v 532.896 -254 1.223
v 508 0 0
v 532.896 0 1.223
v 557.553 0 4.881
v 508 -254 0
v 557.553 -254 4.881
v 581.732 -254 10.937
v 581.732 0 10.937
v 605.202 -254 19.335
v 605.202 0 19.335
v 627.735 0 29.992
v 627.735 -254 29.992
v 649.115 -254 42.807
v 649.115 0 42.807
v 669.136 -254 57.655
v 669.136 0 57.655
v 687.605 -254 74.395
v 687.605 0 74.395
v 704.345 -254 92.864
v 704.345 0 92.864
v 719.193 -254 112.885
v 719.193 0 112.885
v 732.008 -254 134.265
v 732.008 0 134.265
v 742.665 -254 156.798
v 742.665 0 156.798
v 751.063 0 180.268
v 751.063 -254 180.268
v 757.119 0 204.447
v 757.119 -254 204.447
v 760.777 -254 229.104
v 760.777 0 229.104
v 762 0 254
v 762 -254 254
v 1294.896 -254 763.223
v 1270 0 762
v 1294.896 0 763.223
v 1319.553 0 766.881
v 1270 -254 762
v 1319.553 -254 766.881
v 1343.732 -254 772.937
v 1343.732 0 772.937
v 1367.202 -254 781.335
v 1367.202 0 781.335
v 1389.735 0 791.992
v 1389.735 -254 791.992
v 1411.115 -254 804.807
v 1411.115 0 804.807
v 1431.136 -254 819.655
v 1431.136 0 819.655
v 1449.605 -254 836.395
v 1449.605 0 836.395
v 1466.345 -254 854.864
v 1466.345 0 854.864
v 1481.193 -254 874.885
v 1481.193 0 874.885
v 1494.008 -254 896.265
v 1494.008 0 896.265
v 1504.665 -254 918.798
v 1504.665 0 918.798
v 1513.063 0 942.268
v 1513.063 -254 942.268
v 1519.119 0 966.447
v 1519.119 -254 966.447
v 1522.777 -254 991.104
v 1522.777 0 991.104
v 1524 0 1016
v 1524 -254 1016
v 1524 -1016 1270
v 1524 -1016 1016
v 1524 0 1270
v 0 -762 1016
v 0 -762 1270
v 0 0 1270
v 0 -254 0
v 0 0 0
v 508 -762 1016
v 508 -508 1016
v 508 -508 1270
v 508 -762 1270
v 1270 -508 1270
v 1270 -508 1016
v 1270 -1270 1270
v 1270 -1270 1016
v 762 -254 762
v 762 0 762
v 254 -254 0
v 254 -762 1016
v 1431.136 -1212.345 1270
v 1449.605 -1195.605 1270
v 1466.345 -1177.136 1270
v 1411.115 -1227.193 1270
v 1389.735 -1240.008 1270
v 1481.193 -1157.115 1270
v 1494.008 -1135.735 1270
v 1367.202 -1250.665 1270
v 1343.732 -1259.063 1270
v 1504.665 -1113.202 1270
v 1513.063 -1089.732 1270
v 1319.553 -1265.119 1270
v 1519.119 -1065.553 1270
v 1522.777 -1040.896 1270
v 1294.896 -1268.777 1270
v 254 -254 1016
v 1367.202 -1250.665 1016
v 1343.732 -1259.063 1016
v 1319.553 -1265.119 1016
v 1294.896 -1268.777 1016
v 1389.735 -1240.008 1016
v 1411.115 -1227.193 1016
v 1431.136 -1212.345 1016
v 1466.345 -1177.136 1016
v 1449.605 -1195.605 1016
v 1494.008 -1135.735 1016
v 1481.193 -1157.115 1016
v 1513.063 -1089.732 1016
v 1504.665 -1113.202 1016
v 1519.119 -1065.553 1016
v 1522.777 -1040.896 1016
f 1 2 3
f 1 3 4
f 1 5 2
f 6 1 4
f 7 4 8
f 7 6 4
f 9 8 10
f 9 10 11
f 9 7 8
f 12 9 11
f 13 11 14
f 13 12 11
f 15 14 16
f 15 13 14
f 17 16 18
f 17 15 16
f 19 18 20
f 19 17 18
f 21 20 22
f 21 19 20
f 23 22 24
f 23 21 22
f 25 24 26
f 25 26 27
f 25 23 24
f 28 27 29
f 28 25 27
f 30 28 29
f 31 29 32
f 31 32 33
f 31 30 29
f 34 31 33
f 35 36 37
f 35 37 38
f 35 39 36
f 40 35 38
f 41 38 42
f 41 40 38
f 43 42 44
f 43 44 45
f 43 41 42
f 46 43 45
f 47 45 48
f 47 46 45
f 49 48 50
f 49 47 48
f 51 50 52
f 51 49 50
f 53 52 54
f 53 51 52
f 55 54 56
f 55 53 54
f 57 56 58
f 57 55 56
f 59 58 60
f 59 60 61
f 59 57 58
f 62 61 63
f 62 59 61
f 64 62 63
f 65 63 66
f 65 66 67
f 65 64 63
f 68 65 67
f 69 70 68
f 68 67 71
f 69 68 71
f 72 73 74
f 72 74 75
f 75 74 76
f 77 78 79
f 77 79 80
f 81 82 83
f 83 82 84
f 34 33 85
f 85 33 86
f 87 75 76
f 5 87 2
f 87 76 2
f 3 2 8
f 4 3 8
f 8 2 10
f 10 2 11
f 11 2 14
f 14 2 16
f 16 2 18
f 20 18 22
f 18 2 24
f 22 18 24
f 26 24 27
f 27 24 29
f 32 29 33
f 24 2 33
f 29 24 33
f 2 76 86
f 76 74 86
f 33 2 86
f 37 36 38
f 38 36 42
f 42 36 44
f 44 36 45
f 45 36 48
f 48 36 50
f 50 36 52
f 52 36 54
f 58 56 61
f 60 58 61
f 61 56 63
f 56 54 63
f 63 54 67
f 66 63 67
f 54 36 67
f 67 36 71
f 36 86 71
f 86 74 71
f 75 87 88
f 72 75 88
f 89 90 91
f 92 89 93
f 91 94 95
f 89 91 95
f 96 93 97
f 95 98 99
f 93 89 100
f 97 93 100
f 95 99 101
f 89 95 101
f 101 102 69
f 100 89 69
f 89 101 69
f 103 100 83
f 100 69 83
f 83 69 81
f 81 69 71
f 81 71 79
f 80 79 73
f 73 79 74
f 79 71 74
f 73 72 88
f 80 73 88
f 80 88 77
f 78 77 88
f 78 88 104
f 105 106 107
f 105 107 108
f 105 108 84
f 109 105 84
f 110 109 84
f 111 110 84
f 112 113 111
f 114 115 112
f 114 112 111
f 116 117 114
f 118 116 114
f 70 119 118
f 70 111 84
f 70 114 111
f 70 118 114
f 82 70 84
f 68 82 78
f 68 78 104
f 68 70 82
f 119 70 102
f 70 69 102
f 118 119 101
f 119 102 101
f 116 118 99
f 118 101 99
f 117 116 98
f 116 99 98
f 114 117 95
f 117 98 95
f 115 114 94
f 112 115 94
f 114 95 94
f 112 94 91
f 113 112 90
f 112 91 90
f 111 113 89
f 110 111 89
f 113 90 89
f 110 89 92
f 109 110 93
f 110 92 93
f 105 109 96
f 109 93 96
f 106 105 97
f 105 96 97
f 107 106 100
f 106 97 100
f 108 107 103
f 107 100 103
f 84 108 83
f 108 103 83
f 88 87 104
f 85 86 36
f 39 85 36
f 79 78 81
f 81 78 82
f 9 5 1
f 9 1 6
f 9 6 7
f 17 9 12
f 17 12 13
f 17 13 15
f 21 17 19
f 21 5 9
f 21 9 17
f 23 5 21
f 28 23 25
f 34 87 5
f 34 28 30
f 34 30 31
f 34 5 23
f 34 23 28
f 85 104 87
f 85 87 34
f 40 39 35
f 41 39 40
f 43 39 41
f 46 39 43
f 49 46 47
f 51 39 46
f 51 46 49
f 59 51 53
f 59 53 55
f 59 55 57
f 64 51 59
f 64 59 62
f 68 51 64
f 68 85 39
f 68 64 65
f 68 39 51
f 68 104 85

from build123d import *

# Parameters (mm, degrees)
F1_DEPTH  = 1270
F2_W      = 508
F2_H      = 762
F3_DEPTH  = 1016
F4_W      = 1270
F4_H      = 254
F5_DEPTH  = 1016
F6_W      = 762
F6_H      = 762
F7_DEPTH  = 254.001
F8_W      = 508
F8_H      = 1016
F9_DEPTH  = 254.001
F11_DEPTH = 254.001
F12_W     = 508
F12_H     = 508
F13_DEPTH = 254.001
F14_R     = 254
F15_R     = 253.99999


# Not quite as in the source:
# - a fillet or chamfer is up to 0.001 mm smaller than in the source, because OpenCascade refuses the exact size


with BuildPart() as f1:
    # F0 (on Front) → F1 (new body)
    with BuildSketch(Plane.XZ):
        Polygon((0, 1270), (0, 0), (762, 0), (762, 762), (1524, 762), (1524, 1270), align=None)
    extrude(amount=F1_DEPTH)

    # F2 (on face) → F3 (cut)
    with BuildSketch(Plane.XZ.offset(1270)):
        with Locations((508, 381)):
            Rectangle(F2_W, F2_H)
    extrude(amount=-F3_DEPTH, mode=Mode.SUBTRACT)

    # F4 (on face) → F5 (cut)
    with BuildSketch(Plane.XZ.offset(1270)):
        with Locations((889, 889)):
            Rectangle(F4_W, F4_H)
    extrude(amount=-F5_DEPTH, mode=Mode.SUBTRACT)

    # F6 (on face) → F7 (cut, through all)
    with BuildSketch(Plane(origin=(0, 0, 1016), x_dir=(1, 0, 0), z_dir=(0, 0, -1))):
        with Locations((889, 889)):
            Rectangle(F6_W, F6_H)
    extrude(amount=-F7_DEPTH, mode=Mode.SUBTRACT)

    # F8 (on face) → F9 (cut, through all)
    with BuildSketch(Plane.YZ.offset(254)):
        with Locations((-1016, 508)):
            Rectangle(F8_W, F8_H)
    extrude(amount=-F9_DEPTH, mode=Mode.SUBTRACT)

    # F10 (on face) → F11 (cut, through all)
    with BuildSketch(Plane.YZ.offset(254)):
        Polygon((-254, 0), (-762, 1016), (-762, 0), align=None)
    extrude(amount=-F11_DEPTH, mode=Mode.SUBTRACT)

    # F12 (on face) → F13 (cut, through all)
    with BuildSketch(Plane(origin=(0, 0, 1016), x_dir=(1, 0, 0), z_dir=(0, 0, -1))):
        with Locations((254, 1016)):
            Rectangle(F12_W, F12_H)
    extrude(amount=-F13_DEPTH, mode=Mode.SUBTRACT)

    # F14
    f14_edges = [f1.edges().sort_by_distance(p)[0] for p in [
        (762, -127, 0),
        (1524, -127, 762),
    ]]
    fillet(f14_edges, radius=F14_R)

    # F15 (radius 254 in the source; OpenCascade refuses exactly that, so slightly less here)
    f15_edges = [f1.edges().sort_by_distance(p)[0] for p in [
        (1524, -1270, 1143),
    ]]
    fillet(f15_edges, radius=F15_R)


solid = f1.part
